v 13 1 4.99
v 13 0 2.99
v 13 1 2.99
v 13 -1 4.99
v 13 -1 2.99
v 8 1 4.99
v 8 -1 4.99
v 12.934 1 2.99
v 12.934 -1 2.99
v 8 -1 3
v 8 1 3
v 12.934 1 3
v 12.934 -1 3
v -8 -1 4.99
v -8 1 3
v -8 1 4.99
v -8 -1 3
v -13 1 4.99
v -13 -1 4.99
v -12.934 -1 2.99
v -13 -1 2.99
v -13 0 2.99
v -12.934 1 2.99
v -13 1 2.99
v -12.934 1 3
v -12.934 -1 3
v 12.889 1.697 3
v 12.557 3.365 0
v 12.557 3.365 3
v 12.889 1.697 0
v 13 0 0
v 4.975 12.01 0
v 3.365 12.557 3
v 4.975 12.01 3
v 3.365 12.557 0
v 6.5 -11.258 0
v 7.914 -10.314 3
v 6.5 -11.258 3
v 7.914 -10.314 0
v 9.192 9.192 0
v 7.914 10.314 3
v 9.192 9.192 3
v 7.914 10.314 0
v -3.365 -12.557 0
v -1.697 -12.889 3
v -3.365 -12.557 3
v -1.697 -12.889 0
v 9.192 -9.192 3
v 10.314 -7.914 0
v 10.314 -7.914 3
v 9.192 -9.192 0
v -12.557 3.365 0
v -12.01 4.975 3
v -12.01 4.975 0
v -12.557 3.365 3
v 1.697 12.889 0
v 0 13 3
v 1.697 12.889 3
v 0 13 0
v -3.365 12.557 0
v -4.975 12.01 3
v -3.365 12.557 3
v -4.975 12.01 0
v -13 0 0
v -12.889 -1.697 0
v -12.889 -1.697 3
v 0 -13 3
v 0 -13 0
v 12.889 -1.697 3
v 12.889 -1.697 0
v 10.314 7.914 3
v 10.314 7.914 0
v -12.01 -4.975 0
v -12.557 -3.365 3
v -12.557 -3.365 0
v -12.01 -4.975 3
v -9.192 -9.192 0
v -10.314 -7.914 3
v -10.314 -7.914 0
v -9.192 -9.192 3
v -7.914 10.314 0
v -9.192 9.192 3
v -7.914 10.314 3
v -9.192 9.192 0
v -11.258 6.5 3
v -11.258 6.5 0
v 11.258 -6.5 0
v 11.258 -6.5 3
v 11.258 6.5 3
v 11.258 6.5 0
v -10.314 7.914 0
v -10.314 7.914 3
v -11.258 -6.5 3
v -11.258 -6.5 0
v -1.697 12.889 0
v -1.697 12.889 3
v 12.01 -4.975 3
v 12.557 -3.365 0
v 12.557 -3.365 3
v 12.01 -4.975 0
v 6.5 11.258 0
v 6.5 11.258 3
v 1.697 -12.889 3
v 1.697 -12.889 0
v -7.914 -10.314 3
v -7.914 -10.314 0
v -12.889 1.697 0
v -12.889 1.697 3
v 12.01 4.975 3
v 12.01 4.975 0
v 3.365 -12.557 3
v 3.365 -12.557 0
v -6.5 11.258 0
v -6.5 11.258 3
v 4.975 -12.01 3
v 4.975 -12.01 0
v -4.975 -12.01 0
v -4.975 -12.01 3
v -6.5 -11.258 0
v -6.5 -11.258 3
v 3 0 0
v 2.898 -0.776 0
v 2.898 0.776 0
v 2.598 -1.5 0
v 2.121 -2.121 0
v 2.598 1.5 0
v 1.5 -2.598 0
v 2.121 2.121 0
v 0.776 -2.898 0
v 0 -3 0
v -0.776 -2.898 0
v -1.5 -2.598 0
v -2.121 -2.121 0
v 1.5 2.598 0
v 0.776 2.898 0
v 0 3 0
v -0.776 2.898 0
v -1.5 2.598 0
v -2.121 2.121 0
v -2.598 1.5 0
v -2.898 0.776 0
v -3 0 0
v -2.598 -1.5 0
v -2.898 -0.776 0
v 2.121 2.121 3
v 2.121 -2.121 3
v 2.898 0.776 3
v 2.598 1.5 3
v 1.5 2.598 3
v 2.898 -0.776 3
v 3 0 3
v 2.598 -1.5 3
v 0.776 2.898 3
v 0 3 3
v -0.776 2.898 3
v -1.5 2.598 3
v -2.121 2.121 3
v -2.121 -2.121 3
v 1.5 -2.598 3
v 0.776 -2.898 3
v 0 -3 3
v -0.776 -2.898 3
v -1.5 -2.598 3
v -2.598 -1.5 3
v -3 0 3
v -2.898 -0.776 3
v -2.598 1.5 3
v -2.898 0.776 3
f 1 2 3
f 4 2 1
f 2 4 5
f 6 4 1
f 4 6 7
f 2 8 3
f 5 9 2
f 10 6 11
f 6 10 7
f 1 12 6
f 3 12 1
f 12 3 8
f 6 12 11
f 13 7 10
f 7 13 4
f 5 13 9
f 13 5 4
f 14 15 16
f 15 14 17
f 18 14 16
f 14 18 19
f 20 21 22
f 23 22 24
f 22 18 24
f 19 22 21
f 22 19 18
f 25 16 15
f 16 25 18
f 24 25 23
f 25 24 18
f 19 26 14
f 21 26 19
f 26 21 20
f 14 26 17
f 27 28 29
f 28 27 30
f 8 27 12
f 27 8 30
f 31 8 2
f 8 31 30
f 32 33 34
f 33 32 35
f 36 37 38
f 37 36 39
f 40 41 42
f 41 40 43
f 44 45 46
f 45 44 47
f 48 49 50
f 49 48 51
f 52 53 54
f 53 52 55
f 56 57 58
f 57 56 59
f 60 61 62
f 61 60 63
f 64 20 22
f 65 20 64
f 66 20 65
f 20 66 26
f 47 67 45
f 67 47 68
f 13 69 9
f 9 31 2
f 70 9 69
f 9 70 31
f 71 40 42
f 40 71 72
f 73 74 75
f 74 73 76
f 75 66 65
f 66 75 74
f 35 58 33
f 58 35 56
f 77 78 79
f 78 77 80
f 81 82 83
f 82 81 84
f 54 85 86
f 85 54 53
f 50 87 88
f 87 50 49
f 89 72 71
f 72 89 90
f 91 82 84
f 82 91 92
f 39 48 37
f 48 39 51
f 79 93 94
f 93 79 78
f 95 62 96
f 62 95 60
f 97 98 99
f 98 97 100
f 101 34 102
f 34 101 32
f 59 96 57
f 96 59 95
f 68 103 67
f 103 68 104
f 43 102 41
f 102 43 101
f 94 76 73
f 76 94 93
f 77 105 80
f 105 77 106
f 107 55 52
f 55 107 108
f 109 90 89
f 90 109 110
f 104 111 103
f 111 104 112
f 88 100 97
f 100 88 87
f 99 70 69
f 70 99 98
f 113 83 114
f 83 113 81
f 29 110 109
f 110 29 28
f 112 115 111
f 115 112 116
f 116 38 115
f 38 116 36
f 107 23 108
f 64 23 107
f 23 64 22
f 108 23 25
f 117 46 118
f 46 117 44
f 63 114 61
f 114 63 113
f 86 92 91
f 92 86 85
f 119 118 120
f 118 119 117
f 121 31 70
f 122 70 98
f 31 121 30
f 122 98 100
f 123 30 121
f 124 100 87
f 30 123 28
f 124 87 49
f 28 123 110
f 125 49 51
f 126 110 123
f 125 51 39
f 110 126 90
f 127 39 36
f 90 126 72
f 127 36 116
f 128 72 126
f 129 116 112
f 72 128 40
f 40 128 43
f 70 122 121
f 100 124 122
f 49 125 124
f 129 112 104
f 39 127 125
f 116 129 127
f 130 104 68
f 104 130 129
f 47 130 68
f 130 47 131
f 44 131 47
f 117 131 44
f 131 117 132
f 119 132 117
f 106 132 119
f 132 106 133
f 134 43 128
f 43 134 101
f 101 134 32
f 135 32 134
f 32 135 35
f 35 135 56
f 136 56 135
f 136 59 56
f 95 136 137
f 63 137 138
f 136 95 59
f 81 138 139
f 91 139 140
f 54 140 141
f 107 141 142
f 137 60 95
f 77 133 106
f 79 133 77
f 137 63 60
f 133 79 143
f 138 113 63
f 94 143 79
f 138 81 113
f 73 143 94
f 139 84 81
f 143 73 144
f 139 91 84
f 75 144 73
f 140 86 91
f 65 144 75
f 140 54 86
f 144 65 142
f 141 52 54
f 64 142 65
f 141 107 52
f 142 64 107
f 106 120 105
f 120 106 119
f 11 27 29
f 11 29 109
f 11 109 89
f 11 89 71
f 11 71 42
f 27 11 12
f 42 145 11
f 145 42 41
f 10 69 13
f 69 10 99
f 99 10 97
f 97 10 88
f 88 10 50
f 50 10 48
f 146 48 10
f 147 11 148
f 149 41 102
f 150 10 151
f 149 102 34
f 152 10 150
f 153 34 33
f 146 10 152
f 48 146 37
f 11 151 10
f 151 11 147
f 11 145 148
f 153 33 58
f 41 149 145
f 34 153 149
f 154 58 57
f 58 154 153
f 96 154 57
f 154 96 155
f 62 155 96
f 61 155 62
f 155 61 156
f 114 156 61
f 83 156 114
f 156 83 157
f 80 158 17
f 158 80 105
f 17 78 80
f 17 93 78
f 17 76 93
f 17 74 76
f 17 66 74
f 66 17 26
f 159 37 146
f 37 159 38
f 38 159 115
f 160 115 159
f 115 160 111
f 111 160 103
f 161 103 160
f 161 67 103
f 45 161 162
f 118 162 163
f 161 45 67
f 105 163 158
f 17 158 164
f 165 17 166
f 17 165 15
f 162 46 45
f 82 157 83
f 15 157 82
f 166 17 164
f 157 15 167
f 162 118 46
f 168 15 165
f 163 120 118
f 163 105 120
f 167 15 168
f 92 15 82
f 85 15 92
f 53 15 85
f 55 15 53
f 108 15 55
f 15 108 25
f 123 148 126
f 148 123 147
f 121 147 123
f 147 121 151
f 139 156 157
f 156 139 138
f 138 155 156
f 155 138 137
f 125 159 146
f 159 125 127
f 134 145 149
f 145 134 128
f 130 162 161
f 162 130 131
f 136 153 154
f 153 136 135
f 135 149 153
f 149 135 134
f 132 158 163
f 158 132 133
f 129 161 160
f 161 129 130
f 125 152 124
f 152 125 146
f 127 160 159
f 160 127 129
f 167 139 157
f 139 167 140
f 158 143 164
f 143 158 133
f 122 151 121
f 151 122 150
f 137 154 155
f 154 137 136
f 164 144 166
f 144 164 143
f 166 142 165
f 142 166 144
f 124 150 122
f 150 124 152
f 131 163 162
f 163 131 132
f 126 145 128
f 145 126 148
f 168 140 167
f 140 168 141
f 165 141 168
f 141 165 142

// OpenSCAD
// file: nut-header.scad
// Bolt holder for Topeak adjustable bottle cage

// Copyright (C) 2016 Embecosm Limited (www.embecosm.com)

// Contributor: Jeremy Bennett <jeremy.bennett@embecosm.com>

// This file is licensed under the Creative Commons Attribution-ShareAlike 3.0
// Unported License. To view a copy of this license, visit
// http://creativecommons.org/licenses/by-sa/3.0/ or send a letter to Creative
// Commons, PO Box 1866, Mountain View, CA 94042, USA.


// This is the common header

SPILL = 0.5;			// Allowance for flow of plastic
DELTA = 0.01;

BLOCK_D_X = 13 - SPILL *2;
BLOCK_D_Y = 11 - SPILL * 2;
HOLE_H = 3;
NUT_H = 2;
NUT_D = 8 + SPILL * 2;
HOLE_D = 5 + SPILL * 2;
WASHER_D = 27 - SPILL * 2;
WASHER_H = 3;
LUG_X = 6 - SPILL * 2;
LUG_Y = 3 - SPILL * 2;
LUG_H = 2;
LOCK_NUT_X = 15 + SPILL * 2;
LOCK_NUT_Y = 7 + SPILL * 2;
LOCK_NUT_H = 3.5;
LOCK_H = LOCK_NUT_H + 4;
HANDLE_Y = 4 - SPILL * 2;
HANDLE_H = 5;
// main file
// Bolt holder for Topeak adjustable bottle cage

// Copyright (C) 2016 Embecosm Limited (www.embecosm.com)

// Contributor: Jeremy Bennett <jeremy.bennett@embecosm.com>

// This file is licensed under the Creative Commons Attribution-ShareAlike 3.0
// Unported License. To view a copy of this license, visit
// http://creativecommons.org/licenses/by-sa/3.0/ or send a letter to Creative
// Commons, PO Box 1866, Mountain View, CA 94042, USA.


// This is the washer for the outer nut.

include <nut-header.scad>


module hole () {
    translate (v = [0, 0, -DELTA])
        cylinder (r = HOLE_D / 2, h = WASHER_H + DELTA * 2, $fn = 24,
                  center = false);
}

module washer_block () {
    union () {
        translate (v = [(WASHER_D - LUG_X) / 2, 0,
                        LUG_H / 2 + WASHER_H - DELTA  ])
            cube (size = [LUG_X, LUG_Y, LUG_H], center = true);
        translate (v = [-(WASHER_D - LUG_X) / 2, 0,
                        LUG_H / 2 + WASHER_H - DELTA  ])
            cube (size = [LUG_X, LUG_Y, LUG_H], center = true);
        cylinder (r = WASHER_D / 2, h = WASHER_H, $fn = 48,
                  center = false);
    }
}

module washer () {
    difference () {
        washer_block ();
        hole ();
    }
}

washer ();
